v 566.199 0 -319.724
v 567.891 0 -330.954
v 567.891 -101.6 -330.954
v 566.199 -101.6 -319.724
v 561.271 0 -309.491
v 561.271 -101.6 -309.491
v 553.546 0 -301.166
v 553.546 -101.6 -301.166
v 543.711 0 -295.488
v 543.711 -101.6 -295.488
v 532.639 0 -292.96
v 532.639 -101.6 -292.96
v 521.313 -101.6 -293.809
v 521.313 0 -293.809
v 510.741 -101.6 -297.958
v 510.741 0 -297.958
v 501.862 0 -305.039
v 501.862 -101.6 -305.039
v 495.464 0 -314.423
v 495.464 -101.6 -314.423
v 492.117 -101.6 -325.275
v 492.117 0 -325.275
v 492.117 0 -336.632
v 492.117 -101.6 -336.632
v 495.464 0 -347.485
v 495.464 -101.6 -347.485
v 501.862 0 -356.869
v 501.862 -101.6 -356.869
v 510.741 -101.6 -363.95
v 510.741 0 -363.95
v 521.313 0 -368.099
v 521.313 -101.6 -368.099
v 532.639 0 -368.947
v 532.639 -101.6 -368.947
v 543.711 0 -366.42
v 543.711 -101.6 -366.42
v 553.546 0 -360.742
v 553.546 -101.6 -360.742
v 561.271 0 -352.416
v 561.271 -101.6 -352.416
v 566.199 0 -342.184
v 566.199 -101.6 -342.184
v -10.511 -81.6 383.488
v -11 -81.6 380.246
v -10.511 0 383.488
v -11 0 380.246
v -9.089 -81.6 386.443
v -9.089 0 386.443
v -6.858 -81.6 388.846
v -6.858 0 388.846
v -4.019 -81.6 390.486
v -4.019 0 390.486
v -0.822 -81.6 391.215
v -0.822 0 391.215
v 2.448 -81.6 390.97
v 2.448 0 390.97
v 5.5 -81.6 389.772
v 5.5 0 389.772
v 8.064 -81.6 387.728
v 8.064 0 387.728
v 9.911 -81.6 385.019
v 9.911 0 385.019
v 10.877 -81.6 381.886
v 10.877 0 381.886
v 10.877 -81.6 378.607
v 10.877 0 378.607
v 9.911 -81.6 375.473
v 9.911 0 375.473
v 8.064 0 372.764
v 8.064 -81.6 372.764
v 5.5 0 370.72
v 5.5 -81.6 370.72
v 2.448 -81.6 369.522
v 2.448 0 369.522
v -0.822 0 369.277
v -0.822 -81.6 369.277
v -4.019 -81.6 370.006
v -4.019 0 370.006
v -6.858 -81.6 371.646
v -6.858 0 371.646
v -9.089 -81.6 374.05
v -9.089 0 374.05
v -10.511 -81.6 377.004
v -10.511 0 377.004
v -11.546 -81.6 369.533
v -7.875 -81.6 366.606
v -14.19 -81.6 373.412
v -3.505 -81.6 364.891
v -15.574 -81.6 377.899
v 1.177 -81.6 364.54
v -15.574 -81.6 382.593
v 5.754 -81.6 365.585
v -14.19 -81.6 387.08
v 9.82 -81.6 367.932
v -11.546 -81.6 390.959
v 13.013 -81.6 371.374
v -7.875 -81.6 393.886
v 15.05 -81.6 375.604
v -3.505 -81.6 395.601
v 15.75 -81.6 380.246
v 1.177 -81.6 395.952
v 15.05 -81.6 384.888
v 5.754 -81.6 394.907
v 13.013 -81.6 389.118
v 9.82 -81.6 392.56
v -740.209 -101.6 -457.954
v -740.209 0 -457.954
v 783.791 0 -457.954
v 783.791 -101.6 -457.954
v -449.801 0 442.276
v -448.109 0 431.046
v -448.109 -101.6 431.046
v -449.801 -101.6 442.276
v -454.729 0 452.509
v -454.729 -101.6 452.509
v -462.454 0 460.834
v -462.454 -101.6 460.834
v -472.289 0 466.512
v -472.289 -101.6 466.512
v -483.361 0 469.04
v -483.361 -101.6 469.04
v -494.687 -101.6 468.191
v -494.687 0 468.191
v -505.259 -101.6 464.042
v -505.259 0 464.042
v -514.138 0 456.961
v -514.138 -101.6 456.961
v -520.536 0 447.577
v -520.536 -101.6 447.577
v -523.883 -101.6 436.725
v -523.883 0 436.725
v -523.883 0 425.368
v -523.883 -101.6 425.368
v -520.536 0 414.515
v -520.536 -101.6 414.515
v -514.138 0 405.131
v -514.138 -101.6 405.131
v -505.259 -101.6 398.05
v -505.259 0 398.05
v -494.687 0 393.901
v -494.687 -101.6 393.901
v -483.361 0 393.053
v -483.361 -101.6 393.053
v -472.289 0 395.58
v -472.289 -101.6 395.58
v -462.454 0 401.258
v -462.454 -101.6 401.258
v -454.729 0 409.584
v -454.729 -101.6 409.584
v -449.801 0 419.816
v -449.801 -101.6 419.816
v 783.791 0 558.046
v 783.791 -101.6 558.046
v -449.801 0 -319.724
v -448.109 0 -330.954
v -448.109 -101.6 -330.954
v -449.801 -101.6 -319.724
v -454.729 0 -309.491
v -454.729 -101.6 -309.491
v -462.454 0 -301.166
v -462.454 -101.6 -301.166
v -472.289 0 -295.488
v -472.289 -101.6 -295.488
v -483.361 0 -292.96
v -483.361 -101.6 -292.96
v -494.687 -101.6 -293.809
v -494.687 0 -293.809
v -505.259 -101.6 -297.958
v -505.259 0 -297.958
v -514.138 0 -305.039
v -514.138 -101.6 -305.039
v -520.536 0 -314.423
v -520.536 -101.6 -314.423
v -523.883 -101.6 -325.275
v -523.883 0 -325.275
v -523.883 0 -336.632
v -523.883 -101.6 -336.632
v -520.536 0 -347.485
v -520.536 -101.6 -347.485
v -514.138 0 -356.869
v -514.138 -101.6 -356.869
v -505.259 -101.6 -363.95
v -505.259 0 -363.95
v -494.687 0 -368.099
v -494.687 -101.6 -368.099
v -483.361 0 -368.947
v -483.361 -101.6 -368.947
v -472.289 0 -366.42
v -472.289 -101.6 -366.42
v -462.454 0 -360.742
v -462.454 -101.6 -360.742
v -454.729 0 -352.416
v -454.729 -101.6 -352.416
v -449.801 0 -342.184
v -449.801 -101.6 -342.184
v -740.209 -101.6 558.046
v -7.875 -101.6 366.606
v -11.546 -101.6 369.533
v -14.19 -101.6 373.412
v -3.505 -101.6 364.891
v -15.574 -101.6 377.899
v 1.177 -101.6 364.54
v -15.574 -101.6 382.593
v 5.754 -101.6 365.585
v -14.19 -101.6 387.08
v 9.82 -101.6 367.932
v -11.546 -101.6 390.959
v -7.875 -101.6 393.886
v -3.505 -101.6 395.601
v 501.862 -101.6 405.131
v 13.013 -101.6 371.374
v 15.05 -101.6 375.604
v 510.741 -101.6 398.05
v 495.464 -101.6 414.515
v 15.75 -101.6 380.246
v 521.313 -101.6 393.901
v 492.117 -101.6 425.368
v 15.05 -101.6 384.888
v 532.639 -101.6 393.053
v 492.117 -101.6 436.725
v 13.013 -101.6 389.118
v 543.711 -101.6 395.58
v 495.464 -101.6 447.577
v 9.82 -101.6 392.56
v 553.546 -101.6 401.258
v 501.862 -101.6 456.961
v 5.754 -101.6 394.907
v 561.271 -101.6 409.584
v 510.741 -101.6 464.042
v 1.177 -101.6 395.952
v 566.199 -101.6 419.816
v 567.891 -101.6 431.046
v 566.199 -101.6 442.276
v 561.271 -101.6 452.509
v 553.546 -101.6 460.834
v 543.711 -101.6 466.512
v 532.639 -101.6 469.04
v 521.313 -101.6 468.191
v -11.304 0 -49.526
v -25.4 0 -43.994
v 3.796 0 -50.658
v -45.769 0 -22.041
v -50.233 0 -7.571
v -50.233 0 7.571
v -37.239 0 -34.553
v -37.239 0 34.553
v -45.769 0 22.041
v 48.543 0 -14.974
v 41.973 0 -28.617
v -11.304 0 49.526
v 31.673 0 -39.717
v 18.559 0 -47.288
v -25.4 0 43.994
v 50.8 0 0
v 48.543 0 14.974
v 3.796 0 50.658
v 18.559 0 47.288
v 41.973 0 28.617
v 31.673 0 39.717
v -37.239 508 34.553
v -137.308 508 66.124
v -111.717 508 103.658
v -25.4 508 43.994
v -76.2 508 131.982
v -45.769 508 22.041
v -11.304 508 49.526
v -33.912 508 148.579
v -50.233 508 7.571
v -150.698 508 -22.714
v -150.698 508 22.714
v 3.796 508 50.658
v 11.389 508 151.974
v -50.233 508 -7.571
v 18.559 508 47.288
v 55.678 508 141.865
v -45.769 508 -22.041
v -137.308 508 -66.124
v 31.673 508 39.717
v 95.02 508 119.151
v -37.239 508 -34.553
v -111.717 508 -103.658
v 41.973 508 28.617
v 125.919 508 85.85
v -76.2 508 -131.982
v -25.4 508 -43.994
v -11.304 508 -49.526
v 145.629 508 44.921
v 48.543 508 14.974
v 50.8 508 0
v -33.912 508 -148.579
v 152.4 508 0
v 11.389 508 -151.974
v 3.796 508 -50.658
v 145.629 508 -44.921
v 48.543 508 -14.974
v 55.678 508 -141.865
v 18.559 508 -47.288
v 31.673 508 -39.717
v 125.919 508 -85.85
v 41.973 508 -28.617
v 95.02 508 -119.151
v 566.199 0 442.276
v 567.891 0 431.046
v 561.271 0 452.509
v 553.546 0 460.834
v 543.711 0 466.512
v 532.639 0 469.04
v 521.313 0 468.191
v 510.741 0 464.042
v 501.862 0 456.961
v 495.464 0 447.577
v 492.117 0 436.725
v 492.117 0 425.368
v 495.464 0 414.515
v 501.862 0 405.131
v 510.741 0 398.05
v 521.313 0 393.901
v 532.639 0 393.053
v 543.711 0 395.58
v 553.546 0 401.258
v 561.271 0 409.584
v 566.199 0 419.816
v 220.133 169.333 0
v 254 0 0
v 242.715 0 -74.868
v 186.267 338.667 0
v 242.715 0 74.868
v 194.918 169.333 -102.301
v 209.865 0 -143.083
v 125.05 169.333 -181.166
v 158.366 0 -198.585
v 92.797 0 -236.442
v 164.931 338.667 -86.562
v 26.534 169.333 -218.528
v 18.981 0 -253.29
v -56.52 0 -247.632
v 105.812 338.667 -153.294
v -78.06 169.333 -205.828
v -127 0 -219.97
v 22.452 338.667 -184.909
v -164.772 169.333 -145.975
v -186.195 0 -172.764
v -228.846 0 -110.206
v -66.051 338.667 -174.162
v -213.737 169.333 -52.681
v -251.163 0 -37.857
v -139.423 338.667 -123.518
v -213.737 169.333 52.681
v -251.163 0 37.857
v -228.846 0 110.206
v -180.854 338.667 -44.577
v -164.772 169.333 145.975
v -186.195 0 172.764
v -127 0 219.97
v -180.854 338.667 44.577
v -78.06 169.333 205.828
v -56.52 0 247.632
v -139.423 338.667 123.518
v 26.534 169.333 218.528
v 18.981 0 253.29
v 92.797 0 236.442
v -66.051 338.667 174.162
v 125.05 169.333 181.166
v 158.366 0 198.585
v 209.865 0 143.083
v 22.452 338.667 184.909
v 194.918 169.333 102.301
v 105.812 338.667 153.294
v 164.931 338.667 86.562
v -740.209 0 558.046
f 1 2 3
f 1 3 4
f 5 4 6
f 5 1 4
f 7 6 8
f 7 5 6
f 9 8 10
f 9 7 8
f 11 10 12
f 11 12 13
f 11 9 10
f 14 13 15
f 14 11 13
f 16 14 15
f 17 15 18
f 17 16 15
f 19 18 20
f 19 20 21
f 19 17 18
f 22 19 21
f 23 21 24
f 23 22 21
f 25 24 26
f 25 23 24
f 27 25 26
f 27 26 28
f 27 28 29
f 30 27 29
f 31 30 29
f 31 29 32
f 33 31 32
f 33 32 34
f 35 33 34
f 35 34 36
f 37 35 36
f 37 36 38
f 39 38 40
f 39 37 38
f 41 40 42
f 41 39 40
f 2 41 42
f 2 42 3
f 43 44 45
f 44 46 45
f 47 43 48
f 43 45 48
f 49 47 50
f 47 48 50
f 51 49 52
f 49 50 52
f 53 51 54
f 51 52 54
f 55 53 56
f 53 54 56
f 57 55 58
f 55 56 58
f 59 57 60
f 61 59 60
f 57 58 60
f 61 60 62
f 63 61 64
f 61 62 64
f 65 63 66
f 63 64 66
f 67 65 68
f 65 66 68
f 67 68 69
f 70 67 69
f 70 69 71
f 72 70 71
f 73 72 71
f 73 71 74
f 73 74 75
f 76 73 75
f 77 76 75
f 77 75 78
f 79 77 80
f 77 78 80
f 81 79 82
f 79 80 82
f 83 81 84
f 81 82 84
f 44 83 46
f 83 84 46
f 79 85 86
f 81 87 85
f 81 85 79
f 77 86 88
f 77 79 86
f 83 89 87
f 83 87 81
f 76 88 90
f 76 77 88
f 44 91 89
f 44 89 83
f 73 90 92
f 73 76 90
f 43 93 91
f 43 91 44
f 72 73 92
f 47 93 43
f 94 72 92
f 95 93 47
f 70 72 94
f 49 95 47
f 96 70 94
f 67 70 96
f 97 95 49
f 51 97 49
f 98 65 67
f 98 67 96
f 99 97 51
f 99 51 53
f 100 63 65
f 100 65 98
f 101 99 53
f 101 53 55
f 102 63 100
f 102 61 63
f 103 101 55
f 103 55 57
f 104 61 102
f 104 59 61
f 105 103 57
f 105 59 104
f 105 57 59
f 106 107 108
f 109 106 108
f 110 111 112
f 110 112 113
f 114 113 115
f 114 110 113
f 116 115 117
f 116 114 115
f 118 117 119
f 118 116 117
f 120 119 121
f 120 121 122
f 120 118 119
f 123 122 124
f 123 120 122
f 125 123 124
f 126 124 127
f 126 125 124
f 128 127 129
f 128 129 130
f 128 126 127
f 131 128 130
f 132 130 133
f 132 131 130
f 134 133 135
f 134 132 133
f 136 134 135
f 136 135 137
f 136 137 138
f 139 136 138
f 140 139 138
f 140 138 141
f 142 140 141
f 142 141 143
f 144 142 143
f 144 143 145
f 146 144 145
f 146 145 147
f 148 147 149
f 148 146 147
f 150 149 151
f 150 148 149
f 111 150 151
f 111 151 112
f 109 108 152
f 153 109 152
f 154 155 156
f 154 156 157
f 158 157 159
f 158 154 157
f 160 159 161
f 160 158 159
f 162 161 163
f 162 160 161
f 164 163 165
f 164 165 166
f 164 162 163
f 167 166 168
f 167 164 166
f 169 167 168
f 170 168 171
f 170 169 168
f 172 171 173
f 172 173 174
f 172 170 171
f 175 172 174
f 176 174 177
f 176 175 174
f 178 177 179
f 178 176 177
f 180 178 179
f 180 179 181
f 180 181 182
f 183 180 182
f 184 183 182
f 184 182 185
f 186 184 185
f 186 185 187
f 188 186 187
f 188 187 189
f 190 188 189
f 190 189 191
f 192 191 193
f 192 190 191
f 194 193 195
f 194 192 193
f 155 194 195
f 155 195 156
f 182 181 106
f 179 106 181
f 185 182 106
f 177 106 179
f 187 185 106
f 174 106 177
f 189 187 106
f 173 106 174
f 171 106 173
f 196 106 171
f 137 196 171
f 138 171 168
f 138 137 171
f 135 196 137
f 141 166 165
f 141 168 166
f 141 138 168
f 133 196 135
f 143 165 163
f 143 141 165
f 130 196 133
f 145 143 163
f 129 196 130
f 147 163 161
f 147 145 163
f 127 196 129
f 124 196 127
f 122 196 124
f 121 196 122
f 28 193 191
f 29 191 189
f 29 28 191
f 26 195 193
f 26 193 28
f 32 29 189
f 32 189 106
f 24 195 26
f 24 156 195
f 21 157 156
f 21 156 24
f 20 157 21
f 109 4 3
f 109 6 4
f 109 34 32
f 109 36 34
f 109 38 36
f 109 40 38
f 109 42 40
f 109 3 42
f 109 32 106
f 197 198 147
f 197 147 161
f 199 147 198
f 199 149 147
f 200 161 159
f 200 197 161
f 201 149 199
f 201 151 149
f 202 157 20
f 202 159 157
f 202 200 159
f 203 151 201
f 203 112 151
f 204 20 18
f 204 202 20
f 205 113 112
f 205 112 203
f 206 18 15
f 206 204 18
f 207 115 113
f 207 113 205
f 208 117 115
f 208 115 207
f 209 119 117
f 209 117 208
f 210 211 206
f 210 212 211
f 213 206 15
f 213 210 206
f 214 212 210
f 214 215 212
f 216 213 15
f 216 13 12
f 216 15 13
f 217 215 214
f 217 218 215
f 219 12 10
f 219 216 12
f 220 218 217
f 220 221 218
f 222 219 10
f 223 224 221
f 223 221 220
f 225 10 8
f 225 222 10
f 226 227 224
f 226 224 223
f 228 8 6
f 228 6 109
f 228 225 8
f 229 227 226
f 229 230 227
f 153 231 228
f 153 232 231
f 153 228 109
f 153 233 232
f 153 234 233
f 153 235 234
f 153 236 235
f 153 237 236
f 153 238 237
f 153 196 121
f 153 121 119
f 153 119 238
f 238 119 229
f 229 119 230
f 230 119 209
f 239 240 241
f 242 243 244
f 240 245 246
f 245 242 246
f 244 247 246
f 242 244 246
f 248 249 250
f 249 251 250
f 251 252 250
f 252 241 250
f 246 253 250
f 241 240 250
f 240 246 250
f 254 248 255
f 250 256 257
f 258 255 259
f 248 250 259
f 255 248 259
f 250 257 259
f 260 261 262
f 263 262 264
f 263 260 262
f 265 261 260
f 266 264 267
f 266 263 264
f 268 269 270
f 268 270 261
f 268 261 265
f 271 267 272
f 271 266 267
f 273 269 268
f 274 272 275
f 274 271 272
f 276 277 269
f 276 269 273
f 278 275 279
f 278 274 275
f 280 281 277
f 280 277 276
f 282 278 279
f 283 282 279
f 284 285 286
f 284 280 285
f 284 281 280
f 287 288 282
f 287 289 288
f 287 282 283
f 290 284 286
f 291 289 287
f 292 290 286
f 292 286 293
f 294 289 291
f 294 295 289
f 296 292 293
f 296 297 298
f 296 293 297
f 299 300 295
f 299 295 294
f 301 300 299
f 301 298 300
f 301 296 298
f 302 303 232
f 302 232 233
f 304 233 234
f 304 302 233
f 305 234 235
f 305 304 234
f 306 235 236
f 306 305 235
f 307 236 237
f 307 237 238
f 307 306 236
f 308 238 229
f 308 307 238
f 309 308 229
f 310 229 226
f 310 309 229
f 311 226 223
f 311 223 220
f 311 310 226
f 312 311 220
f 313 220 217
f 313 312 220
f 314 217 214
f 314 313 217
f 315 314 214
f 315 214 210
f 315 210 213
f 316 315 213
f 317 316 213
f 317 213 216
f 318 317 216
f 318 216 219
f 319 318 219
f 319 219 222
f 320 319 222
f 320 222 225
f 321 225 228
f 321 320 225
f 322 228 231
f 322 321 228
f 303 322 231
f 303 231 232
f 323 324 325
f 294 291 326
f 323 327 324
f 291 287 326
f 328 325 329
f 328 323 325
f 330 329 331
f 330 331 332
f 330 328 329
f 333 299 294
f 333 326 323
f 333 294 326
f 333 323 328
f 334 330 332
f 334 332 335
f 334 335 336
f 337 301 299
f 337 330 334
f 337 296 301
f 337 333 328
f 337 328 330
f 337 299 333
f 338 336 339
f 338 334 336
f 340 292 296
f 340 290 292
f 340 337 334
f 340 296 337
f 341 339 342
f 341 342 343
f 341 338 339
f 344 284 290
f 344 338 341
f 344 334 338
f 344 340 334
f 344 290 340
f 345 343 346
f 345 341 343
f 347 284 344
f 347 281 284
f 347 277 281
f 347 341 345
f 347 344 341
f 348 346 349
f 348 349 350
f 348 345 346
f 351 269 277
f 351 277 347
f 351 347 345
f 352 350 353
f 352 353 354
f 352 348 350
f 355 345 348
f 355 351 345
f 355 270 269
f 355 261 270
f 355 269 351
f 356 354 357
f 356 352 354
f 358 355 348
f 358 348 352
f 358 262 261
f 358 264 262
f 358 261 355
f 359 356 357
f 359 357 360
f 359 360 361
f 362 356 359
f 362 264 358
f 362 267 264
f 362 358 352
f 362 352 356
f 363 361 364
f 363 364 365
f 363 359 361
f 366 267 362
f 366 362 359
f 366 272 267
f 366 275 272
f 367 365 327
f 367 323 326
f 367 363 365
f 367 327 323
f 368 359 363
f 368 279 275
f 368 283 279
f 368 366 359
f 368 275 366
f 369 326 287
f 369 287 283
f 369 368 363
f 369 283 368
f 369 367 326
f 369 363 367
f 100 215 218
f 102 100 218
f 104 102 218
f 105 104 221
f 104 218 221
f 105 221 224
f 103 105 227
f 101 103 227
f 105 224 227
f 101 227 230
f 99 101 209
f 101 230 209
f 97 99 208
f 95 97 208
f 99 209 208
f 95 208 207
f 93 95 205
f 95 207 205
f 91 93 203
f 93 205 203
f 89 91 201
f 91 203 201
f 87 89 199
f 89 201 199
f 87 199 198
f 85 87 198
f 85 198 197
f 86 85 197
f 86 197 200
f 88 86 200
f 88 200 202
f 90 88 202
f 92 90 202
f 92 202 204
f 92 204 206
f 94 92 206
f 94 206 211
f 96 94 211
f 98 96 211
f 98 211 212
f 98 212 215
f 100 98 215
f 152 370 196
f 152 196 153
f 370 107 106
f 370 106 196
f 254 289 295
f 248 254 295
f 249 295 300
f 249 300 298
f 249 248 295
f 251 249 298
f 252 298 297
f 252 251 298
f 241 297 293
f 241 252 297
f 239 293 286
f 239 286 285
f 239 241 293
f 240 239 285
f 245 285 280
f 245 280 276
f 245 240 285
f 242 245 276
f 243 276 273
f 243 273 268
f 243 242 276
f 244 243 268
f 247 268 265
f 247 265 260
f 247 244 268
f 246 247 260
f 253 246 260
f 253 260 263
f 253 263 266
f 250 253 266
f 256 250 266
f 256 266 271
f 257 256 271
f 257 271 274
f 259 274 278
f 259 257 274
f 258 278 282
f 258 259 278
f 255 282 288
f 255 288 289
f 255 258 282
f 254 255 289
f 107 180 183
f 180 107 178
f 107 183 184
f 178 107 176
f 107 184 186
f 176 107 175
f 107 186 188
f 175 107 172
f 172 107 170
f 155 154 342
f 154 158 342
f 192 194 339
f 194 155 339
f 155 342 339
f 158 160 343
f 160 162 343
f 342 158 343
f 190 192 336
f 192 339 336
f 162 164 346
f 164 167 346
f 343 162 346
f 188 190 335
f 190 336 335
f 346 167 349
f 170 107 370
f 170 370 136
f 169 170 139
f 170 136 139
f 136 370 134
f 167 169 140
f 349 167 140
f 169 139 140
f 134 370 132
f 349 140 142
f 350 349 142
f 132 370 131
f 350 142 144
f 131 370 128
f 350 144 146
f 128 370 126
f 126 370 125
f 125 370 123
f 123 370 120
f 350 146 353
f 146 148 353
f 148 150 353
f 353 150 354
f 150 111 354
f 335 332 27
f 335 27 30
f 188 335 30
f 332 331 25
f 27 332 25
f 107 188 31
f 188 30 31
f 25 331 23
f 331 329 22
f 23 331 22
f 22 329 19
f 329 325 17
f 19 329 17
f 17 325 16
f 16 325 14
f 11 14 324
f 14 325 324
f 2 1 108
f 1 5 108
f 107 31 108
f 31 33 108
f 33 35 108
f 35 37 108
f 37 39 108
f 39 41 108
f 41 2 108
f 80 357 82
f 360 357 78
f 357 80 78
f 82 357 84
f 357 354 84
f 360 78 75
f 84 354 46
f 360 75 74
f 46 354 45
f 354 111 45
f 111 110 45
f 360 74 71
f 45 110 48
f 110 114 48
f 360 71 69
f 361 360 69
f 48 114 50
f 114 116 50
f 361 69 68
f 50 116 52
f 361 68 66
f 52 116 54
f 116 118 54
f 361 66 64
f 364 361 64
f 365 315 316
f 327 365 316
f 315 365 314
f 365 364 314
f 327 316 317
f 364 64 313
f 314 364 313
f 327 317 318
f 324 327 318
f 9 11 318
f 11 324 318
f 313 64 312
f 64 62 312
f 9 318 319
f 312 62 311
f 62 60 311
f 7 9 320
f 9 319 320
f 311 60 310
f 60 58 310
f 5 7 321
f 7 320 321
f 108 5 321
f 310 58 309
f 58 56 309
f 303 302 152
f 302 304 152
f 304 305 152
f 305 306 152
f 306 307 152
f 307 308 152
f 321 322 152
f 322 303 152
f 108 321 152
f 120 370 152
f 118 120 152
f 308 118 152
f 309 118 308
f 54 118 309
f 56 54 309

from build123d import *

# Parameters (mm, degrees)
F0_W           = 1524
F0_H           = 1016
F0_R           = 38.1
F1_DEPTH       = 101.6
F5_D           = 22
F5_CBORE_D     = 31.5
F5_CBORE_DEPTH = 20


with BuildPart() as f1:
    # F0 (on Front) → F1 (new body)
    with BuildSketch(Plane.XZ):
        with Locations((21.7913445085, 50.0460547454)):
            Rectangle(F0_W, F0_H)
        with Locations((-486.2086554915, -330.9539452546)):
            Circle(F0_R, mode=Mode.SUBTRACT)
        with Locations((529.7913445085, -330.9539452546)):
            Circle(F0_R, mode=Mode.SUBTRACT)
        with Locations((-486.2086554915, 431.0460547454)):
            Circle(F0_R, mode=Mode.SUBTRACT)
        with Locations((529.7913445085, 431.0460547454)):
            Circle(F0_R, mode=Mode.SUBTRACT)
    extrude(amount=F1_DEPTH)

    # F2 (on Top) → F3 (revolve)
    with BuildSketch(Plane.XY):
        Polygon((50.8, 508), (50.8, 0), (254, 0), (152.4, 508), align=None)
    revolve(axis=Axis((0, 140.2586251497, 0), (0, 1, 0)))

    # F5 (through all)
    with Locations(Plane.XZ.offset(101.6)):
        with Locations((0, 380.2460547454)):
            CounterBoreHole(F5_D / 2, F5_CBORE_D / 2, F5_CBORE_DEPTH)


solid = f1.part
